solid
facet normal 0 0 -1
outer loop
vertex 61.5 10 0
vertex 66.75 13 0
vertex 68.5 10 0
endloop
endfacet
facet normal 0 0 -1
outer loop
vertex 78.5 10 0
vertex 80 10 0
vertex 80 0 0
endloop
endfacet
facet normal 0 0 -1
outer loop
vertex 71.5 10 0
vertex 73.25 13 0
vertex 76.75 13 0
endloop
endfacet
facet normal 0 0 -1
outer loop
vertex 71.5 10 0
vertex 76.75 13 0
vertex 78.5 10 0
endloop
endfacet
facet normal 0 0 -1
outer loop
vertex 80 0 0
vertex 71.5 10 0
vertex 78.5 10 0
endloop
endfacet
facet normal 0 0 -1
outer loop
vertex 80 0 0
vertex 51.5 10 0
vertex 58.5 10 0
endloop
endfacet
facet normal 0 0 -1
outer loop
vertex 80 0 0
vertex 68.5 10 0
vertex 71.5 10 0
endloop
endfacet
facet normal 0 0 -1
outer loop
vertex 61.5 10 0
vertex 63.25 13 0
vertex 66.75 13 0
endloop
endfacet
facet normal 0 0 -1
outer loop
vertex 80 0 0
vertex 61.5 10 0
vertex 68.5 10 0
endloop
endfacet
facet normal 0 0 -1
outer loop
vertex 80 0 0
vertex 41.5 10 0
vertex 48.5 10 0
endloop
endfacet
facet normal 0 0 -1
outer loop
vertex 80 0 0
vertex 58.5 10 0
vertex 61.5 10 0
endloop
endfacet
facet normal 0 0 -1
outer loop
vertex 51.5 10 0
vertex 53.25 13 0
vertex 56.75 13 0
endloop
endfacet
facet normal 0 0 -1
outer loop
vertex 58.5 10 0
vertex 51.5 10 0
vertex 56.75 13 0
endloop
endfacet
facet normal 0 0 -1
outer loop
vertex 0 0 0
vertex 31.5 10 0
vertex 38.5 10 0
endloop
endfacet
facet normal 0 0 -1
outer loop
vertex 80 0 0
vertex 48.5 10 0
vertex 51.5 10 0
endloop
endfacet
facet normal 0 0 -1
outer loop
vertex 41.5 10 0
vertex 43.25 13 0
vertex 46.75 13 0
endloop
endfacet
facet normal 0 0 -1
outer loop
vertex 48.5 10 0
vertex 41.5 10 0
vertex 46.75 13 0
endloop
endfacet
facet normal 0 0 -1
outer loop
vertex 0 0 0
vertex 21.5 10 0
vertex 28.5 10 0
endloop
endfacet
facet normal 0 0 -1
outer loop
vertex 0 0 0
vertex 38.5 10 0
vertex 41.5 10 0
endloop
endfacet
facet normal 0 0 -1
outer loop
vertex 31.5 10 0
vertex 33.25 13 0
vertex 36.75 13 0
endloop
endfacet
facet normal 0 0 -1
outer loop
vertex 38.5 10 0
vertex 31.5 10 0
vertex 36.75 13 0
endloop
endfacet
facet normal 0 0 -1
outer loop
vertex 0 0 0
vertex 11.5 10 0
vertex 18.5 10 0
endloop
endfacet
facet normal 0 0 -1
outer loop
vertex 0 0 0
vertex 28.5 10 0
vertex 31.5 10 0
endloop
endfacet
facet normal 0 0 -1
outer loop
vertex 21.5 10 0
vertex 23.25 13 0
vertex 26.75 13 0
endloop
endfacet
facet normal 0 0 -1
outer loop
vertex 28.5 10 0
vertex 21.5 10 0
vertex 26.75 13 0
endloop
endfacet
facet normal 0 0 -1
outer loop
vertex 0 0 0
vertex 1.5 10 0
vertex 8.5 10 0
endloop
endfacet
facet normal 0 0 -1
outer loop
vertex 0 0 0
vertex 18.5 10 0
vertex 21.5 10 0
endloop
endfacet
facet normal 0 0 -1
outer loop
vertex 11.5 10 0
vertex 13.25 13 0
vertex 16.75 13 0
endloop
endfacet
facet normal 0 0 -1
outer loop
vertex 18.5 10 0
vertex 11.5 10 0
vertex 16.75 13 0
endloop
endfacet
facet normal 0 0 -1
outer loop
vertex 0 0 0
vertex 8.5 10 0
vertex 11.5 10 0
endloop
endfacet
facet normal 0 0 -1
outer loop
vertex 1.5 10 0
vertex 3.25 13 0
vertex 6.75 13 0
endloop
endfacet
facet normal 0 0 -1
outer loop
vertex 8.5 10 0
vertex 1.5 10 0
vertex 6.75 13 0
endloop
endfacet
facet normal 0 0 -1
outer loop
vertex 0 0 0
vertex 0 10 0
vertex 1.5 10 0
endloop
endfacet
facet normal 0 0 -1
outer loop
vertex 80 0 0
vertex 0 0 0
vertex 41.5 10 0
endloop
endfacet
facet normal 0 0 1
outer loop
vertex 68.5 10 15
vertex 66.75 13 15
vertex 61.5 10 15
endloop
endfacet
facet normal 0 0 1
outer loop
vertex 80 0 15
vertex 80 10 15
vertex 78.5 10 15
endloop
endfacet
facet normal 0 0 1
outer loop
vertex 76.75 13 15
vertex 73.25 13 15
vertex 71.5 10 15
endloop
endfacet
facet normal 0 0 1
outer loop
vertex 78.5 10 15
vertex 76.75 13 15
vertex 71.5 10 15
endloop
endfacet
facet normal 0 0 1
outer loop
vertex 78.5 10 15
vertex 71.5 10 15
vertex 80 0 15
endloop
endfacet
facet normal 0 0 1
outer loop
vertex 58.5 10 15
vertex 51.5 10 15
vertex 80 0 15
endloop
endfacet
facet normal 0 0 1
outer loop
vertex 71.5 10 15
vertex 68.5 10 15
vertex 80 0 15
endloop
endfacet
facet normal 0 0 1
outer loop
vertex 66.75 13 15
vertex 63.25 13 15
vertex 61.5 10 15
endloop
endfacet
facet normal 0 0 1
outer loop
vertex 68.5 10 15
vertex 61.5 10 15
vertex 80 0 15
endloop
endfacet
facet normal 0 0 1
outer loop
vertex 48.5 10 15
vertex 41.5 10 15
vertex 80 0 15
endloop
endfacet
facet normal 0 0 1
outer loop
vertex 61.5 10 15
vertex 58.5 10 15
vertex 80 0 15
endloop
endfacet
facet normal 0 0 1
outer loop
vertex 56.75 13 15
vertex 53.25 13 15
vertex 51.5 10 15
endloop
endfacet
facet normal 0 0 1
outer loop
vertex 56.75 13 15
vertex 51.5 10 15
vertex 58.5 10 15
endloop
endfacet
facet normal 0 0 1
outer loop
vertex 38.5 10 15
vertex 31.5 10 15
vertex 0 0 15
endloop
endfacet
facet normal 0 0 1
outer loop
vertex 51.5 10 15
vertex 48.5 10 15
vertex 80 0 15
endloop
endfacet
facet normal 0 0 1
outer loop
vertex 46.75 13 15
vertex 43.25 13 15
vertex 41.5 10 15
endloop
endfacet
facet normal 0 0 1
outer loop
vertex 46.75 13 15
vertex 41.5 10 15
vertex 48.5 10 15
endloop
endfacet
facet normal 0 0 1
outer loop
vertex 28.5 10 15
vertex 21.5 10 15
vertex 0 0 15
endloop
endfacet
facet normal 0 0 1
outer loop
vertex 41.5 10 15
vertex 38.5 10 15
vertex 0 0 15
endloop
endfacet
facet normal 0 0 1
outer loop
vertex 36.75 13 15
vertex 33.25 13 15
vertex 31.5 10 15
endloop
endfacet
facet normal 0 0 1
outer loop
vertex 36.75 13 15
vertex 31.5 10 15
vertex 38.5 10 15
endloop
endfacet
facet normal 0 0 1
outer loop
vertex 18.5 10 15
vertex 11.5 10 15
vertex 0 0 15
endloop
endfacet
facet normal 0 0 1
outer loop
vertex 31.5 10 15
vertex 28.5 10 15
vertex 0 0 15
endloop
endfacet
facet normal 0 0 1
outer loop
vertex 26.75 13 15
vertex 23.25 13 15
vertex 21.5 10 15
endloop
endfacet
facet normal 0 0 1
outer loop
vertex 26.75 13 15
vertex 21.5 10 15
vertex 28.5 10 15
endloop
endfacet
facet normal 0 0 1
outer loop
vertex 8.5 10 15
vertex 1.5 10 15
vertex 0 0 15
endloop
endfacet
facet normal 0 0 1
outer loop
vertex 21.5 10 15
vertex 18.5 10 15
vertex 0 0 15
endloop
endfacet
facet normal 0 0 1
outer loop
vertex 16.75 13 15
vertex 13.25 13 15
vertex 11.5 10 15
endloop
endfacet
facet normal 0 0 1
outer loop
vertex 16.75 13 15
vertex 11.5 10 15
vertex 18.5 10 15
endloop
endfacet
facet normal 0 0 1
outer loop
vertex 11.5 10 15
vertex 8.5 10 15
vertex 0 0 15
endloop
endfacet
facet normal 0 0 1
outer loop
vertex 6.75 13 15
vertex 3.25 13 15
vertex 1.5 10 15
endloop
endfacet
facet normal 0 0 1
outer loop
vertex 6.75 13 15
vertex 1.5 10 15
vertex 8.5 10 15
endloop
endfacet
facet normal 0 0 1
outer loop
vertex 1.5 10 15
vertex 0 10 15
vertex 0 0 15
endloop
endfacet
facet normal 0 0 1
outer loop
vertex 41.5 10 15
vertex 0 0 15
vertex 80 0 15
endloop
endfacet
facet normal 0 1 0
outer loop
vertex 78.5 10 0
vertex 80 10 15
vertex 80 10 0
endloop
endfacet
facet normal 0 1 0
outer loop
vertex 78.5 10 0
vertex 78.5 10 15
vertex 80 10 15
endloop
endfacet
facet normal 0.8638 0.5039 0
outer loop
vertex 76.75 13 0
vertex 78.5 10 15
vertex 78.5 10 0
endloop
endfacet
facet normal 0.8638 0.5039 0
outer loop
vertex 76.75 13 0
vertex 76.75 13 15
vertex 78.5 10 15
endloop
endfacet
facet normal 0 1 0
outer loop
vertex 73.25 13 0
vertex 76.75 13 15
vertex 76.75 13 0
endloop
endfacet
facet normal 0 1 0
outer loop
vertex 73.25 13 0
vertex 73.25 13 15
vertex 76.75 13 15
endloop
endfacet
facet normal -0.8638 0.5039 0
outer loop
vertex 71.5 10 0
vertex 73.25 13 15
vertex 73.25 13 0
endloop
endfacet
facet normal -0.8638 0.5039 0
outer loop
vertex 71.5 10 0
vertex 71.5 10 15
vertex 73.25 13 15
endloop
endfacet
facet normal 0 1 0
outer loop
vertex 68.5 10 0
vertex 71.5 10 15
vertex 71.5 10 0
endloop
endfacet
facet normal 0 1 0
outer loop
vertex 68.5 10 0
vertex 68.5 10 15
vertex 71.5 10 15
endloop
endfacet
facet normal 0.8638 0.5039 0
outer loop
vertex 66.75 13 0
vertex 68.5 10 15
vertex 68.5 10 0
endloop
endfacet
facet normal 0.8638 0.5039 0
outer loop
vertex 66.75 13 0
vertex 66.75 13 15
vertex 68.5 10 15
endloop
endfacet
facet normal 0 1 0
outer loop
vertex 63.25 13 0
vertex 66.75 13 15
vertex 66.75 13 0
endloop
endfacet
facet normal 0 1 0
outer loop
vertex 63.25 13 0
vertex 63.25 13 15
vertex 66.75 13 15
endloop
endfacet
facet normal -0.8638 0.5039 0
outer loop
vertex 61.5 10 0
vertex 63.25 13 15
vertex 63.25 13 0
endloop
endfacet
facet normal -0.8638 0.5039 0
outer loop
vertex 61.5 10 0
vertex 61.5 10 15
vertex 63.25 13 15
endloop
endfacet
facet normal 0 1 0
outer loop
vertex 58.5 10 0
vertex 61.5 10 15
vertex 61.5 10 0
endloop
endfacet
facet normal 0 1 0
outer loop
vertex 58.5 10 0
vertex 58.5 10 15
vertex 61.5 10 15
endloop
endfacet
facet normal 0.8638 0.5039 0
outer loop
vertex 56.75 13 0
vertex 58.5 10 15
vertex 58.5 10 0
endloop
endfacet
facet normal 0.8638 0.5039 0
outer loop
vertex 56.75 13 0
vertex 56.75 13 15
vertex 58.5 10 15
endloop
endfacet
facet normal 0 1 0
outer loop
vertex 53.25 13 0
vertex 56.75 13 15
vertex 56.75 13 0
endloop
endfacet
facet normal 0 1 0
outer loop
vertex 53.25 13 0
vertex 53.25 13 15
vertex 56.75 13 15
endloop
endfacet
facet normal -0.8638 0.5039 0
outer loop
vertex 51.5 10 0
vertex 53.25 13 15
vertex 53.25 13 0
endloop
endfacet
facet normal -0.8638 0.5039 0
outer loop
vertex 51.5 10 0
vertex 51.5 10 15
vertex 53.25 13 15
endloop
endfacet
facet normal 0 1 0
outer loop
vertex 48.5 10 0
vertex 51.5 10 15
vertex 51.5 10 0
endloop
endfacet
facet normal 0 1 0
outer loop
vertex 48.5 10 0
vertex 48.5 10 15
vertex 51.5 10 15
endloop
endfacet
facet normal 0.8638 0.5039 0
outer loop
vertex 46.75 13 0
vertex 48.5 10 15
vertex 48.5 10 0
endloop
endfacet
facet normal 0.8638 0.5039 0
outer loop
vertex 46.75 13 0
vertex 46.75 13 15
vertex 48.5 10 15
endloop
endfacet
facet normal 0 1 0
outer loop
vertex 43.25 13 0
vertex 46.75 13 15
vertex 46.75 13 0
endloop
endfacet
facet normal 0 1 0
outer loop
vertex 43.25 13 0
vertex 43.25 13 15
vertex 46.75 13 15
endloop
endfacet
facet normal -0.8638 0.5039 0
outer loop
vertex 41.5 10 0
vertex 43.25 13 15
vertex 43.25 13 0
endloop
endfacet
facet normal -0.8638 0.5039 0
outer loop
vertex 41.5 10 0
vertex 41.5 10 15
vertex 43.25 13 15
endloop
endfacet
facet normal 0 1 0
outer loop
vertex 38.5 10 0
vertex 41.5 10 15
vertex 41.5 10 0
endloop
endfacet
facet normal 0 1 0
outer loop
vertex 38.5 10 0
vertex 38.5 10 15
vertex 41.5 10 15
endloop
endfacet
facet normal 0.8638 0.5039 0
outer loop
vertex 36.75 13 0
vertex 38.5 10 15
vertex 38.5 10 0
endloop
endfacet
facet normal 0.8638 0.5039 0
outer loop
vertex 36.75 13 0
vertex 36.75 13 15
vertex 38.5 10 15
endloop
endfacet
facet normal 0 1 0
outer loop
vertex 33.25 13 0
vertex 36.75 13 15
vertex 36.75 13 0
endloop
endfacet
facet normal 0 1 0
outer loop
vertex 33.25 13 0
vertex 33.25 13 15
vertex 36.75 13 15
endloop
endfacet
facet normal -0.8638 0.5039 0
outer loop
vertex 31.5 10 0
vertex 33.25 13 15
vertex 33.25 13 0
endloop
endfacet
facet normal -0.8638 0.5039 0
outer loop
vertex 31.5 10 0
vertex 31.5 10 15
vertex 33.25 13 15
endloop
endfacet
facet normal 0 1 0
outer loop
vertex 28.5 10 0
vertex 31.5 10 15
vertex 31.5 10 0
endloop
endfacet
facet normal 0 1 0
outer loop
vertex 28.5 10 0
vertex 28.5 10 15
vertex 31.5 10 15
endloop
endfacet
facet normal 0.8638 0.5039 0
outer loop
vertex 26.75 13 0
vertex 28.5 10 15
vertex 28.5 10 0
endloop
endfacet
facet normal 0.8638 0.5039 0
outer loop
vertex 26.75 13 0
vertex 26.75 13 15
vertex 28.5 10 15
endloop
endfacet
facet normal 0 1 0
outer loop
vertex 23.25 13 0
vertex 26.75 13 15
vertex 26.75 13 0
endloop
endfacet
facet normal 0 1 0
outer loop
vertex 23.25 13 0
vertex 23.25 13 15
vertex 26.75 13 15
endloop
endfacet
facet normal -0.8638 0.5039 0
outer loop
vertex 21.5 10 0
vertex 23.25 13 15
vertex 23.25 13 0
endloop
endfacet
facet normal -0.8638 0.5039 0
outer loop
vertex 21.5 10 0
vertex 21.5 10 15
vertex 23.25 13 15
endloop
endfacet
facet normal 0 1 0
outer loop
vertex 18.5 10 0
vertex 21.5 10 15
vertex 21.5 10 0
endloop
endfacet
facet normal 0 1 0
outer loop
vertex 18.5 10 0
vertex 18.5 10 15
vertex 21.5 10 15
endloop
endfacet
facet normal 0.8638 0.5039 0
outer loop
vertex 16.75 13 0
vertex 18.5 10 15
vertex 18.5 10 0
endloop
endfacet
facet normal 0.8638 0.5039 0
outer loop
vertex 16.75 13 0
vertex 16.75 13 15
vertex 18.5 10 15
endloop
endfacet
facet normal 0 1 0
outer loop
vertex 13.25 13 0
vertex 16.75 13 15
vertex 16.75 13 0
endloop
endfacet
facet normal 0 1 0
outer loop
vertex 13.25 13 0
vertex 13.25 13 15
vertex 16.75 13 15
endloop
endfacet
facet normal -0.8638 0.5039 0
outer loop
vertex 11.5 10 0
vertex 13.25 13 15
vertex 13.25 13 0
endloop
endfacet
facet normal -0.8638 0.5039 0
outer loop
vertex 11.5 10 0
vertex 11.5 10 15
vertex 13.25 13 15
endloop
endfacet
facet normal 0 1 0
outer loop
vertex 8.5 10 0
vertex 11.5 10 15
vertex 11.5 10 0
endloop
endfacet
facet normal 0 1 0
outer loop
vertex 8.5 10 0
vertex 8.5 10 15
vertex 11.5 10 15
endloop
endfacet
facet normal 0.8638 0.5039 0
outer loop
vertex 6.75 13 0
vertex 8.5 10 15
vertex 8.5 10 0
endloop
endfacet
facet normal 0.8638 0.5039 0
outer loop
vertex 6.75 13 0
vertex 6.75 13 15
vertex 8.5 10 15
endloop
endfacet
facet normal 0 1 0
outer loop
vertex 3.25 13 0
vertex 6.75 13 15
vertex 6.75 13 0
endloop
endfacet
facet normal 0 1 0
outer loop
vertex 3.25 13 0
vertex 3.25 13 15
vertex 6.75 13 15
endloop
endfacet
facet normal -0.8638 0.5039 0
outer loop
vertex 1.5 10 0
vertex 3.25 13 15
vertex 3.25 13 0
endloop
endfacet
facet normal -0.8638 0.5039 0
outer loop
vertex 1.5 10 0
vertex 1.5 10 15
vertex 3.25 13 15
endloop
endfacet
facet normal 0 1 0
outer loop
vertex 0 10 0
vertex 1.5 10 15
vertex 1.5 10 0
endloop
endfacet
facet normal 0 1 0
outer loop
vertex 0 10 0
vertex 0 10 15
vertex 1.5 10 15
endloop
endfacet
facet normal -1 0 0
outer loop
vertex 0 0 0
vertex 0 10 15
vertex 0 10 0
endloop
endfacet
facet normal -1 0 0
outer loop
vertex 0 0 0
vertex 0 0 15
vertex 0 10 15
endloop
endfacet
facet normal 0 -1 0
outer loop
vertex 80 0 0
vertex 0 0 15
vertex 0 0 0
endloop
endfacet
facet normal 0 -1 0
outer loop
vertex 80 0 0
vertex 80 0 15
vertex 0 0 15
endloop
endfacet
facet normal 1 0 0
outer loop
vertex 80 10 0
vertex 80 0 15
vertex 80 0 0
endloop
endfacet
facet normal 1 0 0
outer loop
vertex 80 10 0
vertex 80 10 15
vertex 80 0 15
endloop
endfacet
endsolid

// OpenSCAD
$fn = 32;

// ----------------------------------------------------------------------
// Gear rack: 8 teeth, pitch 10 mm
// ----------------------------------------------------------------------

// --- parameters (mm) ---
teeth = 8;                // number of teeth
pitch = 10;               // tooth pitch, X
root_w = 7;               // tooth width at the root
tip_w = 3.5;              // tooth width at the tip
base_h = 10;              // rack body height, Y
tooth_h = 3;              // tooth height above the body
plate_t = 15;             // rack width, Z (extrusion height)

rack_l = teeth * pitch;  // overall length
total_h = base_h + tooth_h;  // overall height

profile = [[0, 0], [80, 0], [80, 10], [78.5, 10], [76.75, 13], [73.25, 13], [71.5, 10], [68.5, 10], [66.75, 13], [63.25, 13], [61.5, 10], [58.5, 10], [56.75, 13], [53.25, 13], [51.5, 10], [48.5, 10], [46.75, 13], [43.25, 13], [41.5, 10], [38.5, 10], [36.75, 13], [33.25, 13], [31.5, 10], [28.5, 10], [26.75, 13], [23.25, 13], [21.5, 10], [18.5, 10], [16.75, 13], [13.25, 13], [11.5, 10], [8.5, 10], [6.75, 13], [3.25, 13], [1.5, 10], [0, 10]];  // primary outline, 36 points, counter clockwise

// --- the one profile operation ---
linear_extrude(height = plate_t) polygon(points = profile);
